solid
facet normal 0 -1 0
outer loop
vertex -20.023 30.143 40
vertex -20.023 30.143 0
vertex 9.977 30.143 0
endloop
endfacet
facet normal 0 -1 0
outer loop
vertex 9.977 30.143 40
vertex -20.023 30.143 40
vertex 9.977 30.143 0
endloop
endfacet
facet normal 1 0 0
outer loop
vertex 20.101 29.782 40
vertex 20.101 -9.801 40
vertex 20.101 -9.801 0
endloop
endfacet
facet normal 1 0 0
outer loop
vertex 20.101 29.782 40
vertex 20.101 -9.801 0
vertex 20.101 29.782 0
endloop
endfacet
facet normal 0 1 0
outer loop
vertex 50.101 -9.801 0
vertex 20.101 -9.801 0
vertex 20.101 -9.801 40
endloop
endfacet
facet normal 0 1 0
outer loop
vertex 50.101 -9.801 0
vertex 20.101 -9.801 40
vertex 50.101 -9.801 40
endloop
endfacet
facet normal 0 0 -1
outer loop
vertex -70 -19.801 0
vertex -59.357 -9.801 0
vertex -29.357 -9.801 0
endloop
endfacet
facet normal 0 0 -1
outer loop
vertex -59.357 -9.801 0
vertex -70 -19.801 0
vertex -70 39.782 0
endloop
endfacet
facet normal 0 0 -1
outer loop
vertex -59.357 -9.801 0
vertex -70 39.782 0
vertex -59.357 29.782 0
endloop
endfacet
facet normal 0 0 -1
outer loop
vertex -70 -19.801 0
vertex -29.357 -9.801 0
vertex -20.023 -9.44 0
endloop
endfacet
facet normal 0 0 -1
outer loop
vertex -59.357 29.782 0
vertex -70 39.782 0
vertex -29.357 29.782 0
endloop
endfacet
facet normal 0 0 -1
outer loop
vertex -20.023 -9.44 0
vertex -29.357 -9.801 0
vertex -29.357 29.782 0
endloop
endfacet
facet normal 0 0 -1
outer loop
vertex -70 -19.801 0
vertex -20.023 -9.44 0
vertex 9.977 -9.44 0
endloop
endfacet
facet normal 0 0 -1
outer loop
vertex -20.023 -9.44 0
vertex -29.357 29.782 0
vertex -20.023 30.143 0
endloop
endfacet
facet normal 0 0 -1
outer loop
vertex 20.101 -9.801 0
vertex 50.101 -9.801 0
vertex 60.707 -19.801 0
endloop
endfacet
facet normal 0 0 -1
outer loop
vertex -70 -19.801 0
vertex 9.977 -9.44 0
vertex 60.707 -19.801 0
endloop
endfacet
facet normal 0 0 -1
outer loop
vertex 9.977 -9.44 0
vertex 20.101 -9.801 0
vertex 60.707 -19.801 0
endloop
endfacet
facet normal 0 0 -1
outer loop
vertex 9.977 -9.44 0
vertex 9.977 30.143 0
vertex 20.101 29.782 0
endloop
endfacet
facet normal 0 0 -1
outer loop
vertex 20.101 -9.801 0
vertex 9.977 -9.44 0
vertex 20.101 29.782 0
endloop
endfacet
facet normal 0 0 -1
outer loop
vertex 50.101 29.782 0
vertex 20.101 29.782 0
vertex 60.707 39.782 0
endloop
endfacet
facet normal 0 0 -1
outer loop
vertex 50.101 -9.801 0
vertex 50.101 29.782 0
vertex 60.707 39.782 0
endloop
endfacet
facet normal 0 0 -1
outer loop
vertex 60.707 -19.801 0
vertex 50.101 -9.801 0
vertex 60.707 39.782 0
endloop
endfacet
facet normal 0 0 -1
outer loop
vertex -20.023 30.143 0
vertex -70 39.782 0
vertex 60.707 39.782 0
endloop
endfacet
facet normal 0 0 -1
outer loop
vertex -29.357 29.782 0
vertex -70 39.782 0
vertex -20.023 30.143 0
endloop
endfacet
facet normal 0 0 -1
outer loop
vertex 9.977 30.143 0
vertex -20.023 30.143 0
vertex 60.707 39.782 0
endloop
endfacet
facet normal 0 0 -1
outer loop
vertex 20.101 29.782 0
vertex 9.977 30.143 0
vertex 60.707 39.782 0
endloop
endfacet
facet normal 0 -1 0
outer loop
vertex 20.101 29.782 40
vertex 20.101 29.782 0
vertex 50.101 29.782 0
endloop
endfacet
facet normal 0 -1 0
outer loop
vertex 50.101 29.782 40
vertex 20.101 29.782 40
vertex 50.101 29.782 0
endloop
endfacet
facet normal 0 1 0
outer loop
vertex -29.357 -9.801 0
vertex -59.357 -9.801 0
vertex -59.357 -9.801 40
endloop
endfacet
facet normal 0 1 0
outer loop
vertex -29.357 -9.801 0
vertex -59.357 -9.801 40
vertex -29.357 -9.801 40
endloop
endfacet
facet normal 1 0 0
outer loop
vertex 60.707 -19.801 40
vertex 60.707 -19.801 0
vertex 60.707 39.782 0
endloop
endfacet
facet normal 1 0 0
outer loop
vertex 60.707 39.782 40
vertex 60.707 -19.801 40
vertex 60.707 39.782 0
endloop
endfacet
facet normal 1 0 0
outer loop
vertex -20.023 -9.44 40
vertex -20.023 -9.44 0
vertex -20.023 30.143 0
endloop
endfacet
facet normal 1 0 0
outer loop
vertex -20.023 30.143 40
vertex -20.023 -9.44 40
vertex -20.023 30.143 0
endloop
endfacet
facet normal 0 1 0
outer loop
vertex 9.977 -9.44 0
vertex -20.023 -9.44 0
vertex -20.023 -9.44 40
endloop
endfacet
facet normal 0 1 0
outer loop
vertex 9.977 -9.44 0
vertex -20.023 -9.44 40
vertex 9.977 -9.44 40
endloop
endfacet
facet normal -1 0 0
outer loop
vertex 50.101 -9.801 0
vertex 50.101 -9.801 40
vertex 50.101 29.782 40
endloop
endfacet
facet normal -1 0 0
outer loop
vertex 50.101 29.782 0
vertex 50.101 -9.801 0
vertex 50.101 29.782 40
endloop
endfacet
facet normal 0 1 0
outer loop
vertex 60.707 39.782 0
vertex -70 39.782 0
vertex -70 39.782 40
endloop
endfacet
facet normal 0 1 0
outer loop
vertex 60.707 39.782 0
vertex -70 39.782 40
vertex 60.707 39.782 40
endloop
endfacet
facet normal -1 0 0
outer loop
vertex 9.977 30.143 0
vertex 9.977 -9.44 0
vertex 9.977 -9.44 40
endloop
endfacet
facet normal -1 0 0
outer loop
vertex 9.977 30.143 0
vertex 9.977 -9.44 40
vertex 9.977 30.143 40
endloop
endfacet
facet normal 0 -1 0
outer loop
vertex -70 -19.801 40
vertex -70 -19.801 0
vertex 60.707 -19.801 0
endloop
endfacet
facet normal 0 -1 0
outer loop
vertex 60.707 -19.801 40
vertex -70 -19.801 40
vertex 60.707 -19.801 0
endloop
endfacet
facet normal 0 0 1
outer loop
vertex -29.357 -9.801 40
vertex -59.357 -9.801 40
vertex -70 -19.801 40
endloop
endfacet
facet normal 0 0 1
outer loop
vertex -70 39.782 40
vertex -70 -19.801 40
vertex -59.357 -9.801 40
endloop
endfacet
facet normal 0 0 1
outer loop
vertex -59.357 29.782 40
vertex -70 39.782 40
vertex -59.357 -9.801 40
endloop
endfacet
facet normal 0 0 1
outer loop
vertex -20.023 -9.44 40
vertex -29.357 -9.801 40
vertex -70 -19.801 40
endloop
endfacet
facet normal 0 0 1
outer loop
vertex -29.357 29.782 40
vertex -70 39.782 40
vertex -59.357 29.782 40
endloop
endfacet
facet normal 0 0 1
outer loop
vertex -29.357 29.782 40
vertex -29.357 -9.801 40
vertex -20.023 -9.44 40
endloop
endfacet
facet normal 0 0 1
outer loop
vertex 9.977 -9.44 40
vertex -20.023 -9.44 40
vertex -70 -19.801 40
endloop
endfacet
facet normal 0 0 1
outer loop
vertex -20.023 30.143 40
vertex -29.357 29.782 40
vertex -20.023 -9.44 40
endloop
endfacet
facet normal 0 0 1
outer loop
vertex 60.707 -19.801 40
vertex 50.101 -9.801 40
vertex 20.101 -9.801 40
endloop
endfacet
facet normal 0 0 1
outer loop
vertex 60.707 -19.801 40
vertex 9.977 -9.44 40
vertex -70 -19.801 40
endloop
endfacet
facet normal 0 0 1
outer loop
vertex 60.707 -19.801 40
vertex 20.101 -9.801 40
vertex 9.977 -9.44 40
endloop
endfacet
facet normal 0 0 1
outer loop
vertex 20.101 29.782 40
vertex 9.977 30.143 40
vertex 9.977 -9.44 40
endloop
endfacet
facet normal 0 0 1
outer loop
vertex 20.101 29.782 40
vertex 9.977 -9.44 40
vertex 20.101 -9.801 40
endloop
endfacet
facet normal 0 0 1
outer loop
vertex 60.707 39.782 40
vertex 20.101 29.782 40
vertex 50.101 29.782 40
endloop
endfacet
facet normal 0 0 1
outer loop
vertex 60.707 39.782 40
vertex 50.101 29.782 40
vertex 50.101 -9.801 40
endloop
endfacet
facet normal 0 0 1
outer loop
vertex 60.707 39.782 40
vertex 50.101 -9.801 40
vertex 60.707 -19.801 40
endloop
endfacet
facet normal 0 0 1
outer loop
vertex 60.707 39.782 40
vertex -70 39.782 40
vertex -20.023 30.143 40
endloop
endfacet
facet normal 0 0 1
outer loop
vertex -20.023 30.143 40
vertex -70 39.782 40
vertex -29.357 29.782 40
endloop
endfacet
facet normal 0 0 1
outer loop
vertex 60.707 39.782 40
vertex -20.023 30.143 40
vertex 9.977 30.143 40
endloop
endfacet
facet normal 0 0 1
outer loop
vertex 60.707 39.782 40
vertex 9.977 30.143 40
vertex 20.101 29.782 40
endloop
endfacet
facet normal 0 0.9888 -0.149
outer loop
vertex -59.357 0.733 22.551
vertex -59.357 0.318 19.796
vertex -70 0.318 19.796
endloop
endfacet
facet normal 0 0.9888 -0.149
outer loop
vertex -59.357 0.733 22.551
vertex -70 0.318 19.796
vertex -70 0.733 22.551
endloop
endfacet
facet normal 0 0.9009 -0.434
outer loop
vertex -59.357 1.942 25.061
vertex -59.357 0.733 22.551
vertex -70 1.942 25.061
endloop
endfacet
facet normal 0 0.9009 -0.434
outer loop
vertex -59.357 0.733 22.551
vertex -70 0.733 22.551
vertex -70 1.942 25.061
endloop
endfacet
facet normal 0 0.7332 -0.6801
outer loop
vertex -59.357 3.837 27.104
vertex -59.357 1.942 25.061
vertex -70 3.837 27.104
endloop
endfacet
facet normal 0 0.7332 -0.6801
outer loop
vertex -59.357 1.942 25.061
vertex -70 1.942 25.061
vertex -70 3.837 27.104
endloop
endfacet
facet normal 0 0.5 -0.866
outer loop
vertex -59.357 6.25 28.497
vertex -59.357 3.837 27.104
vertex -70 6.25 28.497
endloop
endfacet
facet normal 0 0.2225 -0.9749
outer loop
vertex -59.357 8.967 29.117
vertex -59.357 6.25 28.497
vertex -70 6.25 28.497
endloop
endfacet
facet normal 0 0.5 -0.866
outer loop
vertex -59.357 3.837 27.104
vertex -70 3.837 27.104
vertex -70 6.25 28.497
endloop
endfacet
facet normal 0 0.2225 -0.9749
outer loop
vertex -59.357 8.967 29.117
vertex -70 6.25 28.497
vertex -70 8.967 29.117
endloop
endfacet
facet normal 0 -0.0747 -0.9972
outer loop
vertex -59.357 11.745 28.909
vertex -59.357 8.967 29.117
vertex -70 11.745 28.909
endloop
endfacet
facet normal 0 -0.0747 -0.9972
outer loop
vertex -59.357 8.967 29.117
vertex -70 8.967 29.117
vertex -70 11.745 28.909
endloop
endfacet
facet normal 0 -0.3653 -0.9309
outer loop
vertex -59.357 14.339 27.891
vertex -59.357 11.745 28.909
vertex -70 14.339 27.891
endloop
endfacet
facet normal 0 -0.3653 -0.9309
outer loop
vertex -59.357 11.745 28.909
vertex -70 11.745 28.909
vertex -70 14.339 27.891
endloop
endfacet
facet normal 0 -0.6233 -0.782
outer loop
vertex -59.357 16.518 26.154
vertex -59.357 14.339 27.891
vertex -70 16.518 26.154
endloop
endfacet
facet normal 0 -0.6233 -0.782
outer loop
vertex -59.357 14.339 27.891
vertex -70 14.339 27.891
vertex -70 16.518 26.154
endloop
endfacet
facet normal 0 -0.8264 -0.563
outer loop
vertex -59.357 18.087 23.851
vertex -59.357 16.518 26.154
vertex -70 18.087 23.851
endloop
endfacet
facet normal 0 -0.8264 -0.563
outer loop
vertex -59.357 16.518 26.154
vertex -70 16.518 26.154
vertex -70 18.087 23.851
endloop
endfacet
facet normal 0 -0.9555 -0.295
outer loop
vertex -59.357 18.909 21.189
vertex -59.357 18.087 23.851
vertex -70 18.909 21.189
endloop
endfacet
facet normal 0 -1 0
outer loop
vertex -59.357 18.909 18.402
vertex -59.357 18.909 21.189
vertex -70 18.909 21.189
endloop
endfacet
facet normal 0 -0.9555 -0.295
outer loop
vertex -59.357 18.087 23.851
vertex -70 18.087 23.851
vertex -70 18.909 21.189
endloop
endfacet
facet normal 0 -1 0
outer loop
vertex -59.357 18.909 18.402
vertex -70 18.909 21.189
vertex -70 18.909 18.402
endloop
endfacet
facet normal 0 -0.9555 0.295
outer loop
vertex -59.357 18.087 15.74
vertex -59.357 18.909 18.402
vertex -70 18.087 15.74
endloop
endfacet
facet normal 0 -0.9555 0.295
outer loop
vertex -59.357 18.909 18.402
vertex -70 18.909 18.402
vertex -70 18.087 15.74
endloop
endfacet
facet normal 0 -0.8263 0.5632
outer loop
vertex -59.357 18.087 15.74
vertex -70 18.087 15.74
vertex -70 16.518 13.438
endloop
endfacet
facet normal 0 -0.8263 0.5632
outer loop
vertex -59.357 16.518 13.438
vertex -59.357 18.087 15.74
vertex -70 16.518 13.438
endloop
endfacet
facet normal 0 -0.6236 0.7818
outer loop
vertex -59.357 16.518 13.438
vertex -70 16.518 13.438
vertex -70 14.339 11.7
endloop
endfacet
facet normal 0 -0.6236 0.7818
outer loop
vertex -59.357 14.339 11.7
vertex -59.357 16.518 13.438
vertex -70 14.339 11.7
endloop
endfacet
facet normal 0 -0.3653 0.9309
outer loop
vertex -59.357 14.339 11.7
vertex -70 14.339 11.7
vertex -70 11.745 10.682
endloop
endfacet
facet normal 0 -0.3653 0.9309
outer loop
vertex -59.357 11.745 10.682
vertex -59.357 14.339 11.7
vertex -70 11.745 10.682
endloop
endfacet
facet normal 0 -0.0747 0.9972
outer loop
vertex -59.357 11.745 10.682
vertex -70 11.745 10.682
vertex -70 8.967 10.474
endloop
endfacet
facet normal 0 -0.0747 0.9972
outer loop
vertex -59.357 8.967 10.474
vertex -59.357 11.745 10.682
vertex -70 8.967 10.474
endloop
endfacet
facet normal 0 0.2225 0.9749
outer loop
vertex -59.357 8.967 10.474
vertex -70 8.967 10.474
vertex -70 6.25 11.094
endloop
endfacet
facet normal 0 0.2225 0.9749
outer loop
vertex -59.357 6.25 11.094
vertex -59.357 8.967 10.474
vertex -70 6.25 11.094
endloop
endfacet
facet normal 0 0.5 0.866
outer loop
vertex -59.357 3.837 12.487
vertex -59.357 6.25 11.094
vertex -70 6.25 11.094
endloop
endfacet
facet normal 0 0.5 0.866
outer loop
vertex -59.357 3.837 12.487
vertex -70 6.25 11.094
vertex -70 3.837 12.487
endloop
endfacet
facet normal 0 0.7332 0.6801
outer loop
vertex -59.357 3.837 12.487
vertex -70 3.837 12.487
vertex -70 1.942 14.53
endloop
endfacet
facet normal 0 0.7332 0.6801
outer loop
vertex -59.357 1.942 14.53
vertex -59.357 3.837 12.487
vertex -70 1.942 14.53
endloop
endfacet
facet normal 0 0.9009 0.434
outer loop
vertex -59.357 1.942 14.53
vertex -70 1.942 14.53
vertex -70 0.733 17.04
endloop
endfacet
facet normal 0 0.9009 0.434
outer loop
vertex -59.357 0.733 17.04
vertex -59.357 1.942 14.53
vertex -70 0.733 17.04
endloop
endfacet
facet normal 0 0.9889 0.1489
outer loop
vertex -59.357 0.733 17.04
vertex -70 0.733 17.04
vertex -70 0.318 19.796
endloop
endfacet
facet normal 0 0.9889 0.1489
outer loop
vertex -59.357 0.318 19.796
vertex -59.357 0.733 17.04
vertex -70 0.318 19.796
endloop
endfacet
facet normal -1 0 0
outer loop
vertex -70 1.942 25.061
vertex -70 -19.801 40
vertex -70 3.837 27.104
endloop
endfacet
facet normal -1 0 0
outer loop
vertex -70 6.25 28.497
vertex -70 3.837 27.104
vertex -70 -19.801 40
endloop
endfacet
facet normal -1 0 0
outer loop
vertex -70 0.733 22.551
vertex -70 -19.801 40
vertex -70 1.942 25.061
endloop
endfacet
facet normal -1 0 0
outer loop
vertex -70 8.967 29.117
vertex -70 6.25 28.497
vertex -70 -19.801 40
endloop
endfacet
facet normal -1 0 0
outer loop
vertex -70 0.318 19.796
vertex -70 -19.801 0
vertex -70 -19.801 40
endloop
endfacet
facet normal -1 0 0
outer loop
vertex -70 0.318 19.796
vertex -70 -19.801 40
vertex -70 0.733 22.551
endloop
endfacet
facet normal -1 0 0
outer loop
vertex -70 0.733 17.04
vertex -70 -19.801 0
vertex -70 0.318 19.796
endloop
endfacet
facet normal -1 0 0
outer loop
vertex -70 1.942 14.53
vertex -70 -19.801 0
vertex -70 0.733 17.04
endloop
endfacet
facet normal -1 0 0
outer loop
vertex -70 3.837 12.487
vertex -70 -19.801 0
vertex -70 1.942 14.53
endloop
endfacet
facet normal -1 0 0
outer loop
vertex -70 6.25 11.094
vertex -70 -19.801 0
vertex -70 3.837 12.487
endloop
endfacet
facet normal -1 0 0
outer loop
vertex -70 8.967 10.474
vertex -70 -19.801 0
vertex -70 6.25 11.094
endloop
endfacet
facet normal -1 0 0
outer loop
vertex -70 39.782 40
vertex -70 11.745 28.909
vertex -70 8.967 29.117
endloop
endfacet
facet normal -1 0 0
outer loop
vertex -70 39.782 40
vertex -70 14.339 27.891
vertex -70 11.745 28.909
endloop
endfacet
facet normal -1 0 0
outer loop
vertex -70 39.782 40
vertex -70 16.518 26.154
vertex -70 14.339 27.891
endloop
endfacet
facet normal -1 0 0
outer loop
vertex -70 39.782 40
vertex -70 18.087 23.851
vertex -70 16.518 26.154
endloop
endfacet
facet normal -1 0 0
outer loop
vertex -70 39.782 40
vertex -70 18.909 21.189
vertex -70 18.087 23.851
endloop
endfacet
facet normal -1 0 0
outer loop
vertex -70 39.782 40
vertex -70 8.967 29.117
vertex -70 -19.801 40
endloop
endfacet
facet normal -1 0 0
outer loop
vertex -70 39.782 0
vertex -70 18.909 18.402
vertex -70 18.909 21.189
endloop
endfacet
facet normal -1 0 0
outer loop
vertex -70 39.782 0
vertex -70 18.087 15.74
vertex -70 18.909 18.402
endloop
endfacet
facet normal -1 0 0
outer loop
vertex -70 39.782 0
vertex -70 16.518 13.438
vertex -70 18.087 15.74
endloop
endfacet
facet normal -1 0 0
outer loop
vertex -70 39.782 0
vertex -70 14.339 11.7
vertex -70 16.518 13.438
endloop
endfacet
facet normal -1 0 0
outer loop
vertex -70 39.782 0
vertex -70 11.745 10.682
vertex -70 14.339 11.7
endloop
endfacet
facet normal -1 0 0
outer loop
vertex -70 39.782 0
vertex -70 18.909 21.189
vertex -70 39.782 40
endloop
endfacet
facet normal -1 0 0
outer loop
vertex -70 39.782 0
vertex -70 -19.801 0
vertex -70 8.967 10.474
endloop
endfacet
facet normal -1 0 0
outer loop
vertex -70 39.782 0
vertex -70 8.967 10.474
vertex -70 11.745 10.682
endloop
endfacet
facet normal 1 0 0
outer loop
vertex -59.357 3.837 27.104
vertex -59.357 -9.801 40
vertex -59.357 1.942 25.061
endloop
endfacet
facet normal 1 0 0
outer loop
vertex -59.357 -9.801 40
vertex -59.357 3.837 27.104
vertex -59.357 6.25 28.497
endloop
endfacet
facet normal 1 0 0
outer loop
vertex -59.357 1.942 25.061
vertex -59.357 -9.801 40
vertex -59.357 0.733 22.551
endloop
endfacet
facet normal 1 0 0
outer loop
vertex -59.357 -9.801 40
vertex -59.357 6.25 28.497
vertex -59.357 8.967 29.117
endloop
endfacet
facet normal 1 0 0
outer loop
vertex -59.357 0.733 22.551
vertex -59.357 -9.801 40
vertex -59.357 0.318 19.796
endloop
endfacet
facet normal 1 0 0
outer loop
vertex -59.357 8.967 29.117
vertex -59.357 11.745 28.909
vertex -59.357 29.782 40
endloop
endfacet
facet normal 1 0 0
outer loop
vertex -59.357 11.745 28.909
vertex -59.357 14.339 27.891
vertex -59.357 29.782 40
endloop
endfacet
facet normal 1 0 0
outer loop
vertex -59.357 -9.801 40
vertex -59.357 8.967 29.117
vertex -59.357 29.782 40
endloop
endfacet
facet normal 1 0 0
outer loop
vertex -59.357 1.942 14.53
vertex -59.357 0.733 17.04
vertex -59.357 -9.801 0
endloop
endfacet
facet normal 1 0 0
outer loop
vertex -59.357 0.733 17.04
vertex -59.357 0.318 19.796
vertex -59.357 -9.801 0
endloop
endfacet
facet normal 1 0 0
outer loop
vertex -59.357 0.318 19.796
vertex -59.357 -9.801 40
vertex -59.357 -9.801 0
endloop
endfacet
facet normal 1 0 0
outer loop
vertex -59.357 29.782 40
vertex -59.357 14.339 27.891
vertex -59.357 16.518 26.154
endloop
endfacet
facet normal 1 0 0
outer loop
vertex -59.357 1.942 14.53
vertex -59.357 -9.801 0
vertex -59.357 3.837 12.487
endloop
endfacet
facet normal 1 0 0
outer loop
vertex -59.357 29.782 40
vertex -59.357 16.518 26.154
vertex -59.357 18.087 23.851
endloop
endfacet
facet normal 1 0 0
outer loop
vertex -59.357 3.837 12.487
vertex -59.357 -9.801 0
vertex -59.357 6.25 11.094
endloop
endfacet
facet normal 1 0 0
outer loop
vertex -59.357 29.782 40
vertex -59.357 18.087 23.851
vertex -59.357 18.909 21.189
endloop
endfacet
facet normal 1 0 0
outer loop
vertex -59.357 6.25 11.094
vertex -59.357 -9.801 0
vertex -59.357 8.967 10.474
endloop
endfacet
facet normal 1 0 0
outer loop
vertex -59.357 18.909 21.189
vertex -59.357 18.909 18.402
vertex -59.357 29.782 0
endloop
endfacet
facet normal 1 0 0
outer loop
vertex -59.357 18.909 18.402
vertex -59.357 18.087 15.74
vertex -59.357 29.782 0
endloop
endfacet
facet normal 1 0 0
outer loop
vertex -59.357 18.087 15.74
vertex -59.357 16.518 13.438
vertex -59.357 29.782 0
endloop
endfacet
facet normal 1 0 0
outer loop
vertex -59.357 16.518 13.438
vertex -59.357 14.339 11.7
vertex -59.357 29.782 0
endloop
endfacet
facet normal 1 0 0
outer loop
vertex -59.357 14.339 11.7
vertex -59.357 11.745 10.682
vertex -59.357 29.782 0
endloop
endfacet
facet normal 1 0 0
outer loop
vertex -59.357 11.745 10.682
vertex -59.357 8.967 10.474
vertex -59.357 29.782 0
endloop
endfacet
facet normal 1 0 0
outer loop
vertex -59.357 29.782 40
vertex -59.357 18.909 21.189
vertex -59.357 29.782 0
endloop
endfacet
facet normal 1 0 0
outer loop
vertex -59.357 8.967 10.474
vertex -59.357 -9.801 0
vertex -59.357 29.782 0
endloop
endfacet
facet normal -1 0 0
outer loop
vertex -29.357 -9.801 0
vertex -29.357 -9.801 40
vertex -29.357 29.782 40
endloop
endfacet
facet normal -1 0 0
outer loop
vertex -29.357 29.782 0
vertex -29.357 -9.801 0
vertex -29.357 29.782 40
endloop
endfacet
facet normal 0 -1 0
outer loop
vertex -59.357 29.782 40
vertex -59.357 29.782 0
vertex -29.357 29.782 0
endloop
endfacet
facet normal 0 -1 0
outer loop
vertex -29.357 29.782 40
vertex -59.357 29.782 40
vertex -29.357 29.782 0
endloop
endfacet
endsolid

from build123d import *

# Parameters (mm, degrees)
SKETCH_W     = 130.707065
SKETCH_H     = 59.583364
SKETCH_W_2   = 30
SKETCH_H_2   = 39.583364
PAD_DEPTH    = 40
SKETCH001_R  = 9.347601
POCKET_DEPTH = 32


with BuildPart() as part:
    # Sketch → Pad (new body)
    with BuildSketch(Plane.XY):
        with Locations((-4.646459, 9.990193)):
            Rectangle(SKETCH_W, SKETCH_H)
        with Locations((-44.357391, 9.990193)):
            Rectangle(SKETCH_W_2, SKETCH_H_2, mode=Mode.SUBTRACT)
        with Locations((-5.023146, 10.351241)):
            Rectangle(SKETCH_W_2, SKETCH_H_2, mode=Mode.SUBTRACT)
        with Locations((35.101015, 9.990193)):
            Rectangle(SKETCH_W_2, SKETCH_H_2, mode=Mode.SUBTRACT)
    extrude(amount=PAD_DEPTH)

    # Sketch001 (on Face4 of Pad) → Pocket (cut)
    with BuildSketch(Plane(origin=(-69.999992, 0, 0), x_dir=(0, -1, 0), z_dir=(-1, 0, 0))):
        with Locations((-9.665334, 19.795595)):
            Circle(SKETCH001_R)
    extrude(amount=-POCKET_DEPTH, mode=Mode.SUBTRACT)


solid = part.part
